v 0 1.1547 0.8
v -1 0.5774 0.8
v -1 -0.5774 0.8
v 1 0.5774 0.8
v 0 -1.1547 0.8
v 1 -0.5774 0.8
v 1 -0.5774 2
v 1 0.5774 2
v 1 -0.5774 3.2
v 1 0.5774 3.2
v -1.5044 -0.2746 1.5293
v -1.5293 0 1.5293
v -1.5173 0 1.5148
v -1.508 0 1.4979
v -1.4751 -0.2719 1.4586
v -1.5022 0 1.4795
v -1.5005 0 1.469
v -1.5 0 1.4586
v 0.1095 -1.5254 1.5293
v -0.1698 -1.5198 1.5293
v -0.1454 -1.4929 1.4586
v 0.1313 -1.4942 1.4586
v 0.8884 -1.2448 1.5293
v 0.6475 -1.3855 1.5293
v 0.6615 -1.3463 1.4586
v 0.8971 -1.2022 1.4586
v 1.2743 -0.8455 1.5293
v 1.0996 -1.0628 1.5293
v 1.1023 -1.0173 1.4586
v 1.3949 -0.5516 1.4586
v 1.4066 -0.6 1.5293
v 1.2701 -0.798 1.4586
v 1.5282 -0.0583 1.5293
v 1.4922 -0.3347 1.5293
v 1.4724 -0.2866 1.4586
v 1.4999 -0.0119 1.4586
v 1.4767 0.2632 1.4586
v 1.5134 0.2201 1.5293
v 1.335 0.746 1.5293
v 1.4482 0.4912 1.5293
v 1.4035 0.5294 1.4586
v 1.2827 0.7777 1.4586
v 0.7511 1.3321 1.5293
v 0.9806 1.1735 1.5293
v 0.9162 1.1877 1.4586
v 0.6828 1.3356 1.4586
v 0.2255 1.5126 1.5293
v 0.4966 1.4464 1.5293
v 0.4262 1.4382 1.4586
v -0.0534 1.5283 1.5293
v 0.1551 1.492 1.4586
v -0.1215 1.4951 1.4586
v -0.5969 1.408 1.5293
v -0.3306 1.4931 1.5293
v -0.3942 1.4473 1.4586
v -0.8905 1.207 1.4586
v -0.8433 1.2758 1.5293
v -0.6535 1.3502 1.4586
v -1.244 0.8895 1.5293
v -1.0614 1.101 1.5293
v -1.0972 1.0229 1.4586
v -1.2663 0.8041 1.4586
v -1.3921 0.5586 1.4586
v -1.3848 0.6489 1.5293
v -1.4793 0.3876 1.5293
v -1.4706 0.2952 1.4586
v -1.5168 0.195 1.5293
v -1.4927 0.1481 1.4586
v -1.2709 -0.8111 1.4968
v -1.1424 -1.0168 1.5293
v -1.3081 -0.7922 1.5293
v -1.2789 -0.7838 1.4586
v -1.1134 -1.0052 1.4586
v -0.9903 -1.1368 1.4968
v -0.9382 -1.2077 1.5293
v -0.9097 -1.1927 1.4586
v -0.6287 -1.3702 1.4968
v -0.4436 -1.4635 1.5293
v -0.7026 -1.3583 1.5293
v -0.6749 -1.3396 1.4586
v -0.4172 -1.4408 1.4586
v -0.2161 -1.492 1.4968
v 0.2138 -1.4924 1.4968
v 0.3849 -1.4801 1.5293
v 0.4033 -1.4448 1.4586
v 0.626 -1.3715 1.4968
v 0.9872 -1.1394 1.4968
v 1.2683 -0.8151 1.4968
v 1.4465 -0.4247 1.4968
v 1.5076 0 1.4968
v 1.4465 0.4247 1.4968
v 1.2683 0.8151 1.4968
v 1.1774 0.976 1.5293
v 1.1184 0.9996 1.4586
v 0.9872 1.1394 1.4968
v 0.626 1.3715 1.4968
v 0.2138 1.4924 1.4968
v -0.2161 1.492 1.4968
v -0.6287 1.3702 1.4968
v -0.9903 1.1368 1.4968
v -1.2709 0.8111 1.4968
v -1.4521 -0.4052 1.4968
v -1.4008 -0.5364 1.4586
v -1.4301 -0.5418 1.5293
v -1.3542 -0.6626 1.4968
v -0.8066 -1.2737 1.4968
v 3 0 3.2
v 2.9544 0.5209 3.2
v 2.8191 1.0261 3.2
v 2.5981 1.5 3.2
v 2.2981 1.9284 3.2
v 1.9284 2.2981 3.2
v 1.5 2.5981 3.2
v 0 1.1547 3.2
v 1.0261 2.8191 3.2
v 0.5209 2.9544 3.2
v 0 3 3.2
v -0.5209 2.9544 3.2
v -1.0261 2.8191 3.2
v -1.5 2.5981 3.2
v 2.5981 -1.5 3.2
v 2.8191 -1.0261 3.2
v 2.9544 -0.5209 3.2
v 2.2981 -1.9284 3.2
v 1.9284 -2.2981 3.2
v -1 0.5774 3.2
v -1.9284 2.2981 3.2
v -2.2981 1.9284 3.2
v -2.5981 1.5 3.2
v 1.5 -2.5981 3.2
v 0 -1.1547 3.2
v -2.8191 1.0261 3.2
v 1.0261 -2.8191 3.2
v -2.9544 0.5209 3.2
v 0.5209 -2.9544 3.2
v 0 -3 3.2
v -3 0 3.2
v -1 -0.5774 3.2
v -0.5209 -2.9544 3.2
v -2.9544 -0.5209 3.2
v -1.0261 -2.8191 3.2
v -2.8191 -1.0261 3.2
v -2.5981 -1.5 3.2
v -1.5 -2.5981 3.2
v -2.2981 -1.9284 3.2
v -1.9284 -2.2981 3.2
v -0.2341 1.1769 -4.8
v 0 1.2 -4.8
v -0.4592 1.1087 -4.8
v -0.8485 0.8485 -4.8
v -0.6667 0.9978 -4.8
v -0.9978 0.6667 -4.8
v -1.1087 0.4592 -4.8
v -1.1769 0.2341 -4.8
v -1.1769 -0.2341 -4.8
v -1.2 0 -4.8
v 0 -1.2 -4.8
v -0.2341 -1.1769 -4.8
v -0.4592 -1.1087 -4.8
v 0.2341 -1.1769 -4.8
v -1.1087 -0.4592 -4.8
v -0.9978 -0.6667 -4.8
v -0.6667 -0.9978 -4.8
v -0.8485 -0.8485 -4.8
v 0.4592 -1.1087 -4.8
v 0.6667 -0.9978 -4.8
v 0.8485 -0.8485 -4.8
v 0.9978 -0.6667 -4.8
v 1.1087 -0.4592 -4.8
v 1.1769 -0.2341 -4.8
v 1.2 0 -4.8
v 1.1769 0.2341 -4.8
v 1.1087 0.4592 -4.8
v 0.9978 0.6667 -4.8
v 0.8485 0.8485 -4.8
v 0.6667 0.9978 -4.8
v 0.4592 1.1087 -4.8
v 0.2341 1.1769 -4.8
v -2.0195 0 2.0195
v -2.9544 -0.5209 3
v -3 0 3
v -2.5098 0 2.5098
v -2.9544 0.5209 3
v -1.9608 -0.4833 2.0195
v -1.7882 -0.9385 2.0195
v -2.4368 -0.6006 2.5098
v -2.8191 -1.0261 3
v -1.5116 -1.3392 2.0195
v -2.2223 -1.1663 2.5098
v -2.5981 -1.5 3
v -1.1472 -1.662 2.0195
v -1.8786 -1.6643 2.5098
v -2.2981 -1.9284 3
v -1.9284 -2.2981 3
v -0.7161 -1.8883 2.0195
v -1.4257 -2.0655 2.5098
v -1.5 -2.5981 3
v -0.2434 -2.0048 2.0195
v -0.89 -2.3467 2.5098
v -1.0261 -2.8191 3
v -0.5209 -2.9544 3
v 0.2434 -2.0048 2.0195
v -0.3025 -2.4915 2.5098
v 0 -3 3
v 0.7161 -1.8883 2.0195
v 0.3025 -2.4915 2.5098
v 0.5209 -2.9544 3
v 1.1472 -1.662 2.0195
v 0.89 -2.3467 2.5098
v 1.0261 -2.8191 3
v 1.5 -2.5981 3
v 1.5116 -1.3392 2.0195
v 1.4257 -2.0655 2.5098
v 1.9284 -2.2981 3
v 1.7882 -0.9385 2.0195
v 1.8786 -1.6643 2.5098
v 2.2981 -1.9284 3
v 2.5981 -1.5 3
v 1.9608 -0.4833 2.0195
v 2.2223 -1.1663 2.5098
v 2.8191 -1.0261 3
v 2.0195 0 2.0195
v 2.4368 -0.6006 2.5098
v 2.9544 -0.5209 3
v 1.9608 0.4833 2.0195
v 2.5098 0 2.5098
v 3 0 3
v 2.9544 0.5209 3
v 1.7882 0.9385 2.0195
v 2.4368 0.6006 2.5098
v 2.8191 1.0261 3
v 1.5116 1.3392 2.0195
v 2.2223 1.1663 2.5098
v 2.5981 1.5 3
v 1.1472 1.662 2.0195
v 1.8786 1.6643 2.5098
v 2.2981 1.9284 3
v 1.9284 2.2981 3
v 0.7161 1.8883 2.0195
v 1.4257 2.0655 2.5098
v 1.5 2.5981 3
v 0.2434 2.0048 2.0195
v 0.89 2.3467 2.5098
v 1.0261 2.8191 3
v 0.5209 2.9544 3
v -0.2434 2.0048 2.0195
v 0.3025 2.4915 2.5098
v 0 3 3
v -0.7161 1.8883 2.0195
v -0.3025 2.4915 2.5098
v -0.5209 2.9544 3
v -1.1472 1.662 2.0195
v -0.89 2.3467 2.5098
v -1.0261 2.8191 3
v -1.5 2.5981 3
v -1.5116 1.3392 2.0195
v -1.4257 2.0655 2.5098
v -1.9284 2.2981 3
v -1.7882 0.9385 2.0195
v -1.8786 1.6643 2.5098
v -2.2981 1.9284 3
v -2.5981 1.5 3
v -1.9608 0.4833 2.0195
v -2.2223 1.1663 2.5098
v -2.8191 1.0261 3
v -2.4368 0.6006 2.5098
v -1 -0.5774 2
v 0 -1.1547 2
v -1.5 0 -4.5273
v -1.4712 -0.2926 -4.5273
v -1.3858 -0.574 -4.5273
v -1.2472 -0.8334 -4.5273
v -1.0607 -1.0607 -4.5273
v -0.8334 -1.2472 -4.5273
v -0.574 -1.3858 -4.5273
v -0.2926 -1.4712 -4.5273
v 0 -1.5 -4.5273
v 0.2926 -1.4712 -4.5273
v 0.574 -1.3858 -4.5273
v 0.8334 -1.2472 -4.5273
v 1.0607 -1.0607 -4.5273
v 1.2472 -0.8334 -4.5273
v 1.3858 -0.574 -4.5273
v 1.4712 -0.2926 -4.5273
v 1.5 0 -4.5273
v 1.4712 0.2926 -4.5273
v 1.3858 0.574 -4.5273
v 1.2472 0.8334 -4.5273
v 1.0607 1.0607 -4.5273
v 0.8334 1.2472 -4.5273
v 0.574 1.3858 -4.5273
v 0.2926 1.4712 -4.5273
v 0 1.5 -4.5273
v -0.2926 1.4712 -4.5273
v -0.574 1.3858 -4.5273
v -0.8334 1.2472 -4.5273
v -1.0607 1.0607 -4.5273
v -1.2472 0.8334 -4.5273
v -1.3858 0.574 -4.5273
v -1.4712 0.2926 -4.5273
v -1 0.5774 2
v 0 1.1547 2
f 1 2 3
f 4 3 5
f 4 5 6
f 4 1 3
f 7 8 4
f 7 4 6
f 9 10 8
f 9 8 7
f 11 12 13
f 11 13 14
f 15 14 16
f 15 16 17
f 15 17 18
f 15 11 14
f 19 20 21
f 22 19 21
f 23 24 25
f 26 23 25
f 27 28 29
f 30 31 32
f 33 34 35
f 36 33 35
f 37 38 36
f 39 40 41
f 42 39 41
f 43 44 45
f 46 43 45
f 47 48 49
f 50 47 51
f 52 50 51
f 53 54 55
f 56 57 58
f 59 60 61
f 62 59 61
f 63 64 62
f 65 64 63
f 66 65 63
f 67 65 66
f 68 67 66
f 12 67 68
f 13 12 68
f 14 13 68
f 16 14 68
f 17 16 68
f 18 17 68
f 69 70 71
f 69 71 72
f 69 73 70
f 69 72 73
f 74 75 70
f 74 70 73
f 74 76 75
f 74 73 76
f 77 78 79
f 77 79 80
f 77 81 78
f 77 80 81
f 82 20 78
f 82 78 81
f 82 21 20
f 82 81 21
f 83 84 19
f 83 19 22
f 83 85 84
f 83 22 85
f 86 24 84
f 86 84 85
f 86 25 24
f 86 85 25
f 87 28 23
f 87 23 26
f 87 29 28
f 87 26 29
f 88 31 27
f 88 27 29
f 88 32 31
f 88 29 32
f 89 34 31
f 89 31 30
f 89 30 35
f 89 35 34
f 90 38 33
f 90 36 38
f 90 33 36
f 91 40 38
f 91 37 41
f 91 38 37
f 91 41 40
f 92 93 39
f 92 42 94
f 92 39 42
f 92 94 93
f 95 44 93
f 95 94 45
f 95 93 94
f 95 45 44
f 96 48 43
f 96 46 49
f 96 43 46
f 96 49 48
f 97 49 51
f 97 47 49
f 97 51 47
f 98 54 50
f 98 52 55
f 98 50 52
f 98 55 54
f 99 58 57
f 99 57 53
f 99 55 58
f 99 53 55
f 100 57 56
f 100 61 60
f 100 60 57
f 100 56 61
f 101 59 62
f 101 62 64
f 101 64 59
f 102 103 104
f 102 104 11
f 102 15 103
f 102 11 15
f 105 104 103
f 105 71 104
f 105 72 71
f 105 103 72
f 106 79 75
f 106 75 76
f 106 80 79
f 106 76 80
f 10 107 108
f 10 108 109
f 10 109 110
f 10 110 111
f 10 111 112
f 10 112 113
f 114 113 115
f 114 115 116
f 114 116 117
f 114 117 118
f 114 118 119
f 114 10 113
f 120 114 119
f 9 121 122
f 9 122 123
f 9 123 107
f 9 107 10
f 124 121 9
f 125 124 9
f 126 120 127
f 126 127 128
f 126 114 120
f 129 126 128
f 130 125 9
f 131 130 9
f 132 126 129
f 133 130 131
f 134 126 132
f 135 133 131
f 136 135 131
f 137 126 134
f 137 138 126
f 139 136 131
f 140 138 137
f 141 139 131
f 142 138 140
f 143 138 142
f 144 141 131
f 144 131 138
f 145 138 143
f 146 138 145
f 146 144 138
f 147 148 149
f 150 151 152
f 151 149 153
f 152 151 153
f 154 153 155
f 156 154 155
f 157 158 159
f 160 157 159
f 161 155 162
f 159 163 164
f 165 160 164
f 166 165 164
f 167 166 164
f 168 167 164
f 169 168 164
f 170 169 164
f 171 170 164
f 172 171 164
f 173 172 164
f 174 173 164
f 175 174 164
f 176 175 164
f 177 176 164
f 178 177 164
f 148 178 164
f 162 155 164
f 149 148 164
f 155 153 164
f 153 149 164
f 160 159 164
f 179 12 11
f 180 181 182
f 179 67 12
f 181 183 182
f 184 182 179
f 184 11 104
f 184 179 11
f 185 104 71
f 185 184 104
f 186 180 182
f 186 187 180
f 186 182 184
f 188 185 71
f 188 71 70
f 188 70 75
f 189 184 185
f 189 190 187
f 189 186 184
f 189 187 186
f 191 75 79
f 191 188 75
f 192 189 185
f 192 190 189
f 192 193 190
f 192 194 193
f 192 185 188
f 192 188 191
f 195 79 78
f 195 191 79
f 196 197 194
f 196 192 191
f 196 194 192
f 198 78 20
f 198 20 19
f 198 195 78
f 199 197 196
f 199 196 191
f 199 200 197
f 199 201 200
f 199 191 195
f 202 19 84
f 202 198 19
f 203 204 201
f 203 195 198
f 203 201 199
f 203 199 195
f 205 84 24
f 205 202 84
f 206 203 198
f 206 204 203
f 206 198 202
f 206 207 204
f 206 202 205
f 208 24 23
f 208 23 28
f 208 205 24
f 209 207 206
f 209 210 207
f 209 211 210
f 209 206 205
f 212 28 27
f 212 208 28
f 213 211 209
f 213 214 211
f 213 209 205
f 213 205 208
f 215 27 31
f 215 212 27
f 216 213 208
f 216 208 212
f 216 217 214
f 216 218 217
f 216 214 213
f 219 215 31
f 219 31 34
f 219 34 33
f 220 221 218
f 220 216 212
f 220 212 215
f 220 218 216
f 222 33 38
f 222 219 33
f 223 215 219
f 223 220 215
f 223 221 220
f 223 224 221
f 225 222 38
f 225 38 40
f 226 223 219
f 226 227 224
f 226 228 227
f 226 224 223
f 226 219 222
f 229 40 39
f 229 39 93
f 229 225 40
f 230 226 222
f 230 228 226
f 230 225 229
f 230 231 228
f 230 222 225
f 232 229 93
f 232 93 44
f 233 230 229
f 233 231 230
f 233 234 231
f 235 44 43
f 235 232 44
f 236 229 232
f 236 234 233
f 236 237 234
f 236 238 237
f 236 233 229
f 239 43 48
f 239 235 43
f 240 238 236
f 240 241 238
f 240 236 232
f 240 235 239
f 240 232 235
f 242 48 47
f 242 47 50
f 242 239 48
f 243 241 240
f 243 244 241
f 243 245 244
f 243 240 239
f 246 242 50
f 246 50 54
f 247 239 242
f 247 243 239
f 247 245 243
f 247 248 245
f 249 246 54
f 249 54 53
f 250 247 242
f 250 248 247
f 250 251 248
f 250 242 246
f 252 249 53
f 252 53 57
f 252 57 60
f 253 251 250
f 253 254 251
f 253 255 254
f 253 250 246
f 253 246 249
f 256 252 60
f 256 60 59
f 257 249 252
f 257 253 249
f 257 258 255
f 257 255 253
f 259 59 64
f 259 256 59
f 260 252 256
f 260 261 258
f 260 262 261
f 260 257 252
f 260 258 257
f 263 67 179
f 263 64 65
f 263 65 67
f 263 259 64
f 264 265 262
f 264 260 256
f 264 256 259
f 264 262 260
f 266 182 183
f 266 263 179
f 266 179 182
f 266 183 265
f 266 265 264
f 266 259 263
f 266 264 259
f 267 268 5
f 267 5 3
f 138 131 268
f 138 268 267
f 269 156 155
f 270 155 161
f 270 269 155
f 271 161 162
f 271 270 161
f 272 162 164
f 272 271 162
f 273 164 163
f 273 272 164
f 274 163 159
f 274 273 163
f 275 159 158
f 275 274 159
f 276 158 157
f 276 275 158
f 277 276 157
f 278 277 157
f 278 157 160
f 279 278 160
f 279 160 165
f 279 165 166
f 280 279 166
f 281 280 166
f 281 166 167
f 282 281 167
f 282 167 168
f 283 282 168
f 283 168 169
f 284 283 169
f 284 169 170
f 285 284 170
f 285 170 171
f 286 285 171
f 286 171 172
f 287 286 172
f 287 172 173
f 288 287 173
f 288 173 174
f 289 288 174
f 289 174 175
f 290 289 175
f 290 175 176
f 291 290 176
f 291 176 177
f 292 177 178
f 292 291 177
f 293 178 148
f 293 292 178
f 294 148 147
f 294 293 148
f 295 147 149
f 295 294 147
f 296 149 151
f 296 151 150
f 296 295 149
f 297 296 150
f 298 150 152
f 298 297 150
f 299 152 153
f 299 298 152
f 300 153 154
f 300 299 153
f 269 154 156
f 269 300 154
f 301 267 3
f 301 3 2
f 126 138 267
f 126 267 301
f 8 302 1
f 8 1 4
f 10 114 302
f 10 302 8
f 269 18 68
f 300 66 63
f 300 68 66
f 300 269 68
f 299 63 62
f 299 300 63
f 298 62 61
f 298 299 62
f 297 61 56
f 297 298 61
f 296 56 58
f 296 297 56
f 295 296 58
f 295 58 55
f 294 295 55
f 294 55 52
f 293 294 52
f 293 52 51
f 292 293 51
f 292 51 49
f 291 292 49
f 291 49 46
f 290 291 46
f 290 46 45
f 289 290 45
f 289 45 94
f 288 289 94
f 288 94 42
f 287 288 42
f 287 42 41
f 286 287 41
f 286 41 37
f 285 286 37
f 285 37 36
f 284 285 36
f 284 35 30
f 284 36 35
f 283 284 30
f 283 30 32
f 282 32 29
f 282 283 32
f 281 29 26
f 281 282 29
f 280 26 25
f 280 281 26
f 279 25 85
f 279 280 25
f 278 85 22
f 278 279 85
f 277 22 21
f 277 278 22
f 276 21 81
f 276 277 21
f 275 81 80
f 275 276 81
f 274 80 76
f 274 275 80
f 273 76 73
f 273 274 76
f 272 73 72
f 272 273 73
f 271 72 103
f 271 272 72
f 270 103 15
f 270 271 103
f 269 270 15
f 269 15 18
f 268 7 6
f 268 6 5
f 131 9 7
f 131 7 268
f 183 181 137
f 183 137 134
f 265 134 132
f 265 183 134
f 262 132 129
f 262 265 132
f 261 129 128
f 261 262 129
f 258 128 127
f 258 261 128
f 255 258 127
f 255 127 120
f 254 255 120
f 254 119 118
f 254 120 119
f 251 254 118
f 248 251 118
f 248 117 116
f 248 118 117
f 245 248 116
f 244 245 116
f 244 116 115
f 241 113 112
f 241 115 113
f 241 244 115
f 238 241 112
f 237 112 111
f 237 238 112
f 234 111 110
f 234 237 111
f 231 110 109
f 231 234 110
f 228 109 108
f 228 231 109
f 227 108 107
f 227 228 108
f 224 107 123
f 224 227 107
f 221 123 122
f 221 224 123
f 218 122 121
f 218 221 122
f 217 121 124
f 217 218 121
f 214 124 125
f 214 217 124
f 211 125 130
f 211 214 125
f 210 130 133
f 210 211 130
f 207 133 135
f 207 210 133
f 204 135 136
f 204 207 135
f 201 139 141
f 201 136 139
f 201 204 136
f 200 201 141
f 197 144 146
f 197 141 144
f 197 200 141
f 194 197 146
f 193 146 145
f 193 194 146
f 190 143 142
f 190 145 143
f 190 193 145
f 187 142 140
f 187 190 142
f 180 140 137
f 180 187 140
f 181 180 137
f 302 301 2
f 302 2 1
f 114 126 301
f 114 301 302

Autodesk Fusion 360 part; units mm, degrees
sketch "Sketch1" plane through (0, 0, 0) normal (0, 1, 0) x (1, 0, 0)
  line L0 (0, -3.2) -> (-3, -3.2)
  line L1 (-3, -3.2) -> (-3, -3)
  line L2 (-3, -3) -> (-1.5, -1.5)
  line L3 (-1.5, -1.5) -> (-1.5, 4.8)
  line L4 (-1.5, -1.5) -> (0, 0) construction
  line L5 (-1.5, 4.8) -> (0, 4.8)
  line L6 (0, 4.8) -> (0, -3.2)
  dimension "d5" = 45
  dimension "d9" = 3
  dimension "d10" = 8
  dimension "d72" = 1.7
  dimension "d73" = 6
revolve "Revolve1" add sketch "Sketch1" angle 360 about axis through (0, 0, -4.8) along (0, 0, 1)
sketch "Sketch6" plane through (0, 0, 3.2) normal (0, 0, 1) x (1, 0, 0)
  circle A0 centre (0, 0) radius 3
  line L0 (-1, 0) -> (1, 0) construction
  line L1 (-1, -0.5774) -> (-1, 0.5774)
  line L2 (-1, 0.5774) -> (0, 0)
  line L3 (-1, -0.5774) -> (0, 0)
  dimension "d65" = 2
  dimension "d67" = 60
extrude "Extrude1" cut sketch "Sketch6" against normal blind 1.2 contours L1 L2 L3
pattern_circular "C-Pattern1" count 6 over 360 about axis through (0, 0, 1.75) along (0, 0, 1) of "Extrude1"
extrude "Extrude2" cut 1 faces at (-0.3333, 0.1925, 2) along direction (0, 0, -1) blind 1.2
fillet "Fillet6" radius 0.1 1 edges at (-1.3985, 0.5424, 1.5)
thread "Thread2" thread offset 0 thread length 5.3
sketch "Sketch8" plane through (0, 0, 0) normal (0, 1, 0) x (1, 0, 0)
  line L0 (-3, -3.2) -> (-3, -3)
  line L1 (-3, -3) -> (-1.5, -1.5)
  line L2 (0, 4.8) -> (0, -3.2)
  line L3 (0, -3.2) -> (-3, -3.2)
  line L4 (0, 4.8) -> (-1.53, 4.8)
  line L5 (-1.53, 4.8) -> (-1.53, 4.5)
  line L6 (-1.53, 4.5) -> (-1.2, 4.8)
  dimension "d104" = 1.2
  dimension "d106" = 1.53
  dimension "d107" = 0.3
revolve "Revolve3" cut sketch "Sketch8" angle 360 about axis through (0, 0, -4.8) along (0, 0, 1)
equation "d5 = adsk_headang * 0.5"
equation "d9 = adsk_nomdia"
equation "d10 = adsk_nomlen"
equation "adsk_nomlen = 8.00 mm"
equation "adsk_headh = 1.70 mm"
equation "adsk_headdia = 6.00 mm"
equation "adsk_nomdia = 3.00 mm"
equation "adsk_headang = 90.00 deg"
equation "adsk_philwidth = 2.00 mm"
equation "adsk_phildepth = 1.20 mm"
equation "d65 = adsk_philwidth"
equation "d72 = adsk_headh"
equation "d73 = adsk_headdia"
equation "d77 = adsk_thrlen"
equation "adsk_thrlen = 5.30 mm"
equation "adsk_midfillet = 0.10 mm"
equation "d85 = adsk_midfillet"
equation "adsk_startlen = adsk_nomdia * 0.1"
equation "d99 = ( adsk_nomdia / 2 ) * tan(90 deg - adsk_headang / 2) + adsk_headh"
equation "adsk_endpointdia = adsk_nomdia - 2 * adsk_startlen"
equation "d104 = adsk_endpointdia / 2"
equation "d106 = adsk_nomdia * 0.51"
equation "d107 = adsk_startlen"
properties part number "arrangementsContainer"
